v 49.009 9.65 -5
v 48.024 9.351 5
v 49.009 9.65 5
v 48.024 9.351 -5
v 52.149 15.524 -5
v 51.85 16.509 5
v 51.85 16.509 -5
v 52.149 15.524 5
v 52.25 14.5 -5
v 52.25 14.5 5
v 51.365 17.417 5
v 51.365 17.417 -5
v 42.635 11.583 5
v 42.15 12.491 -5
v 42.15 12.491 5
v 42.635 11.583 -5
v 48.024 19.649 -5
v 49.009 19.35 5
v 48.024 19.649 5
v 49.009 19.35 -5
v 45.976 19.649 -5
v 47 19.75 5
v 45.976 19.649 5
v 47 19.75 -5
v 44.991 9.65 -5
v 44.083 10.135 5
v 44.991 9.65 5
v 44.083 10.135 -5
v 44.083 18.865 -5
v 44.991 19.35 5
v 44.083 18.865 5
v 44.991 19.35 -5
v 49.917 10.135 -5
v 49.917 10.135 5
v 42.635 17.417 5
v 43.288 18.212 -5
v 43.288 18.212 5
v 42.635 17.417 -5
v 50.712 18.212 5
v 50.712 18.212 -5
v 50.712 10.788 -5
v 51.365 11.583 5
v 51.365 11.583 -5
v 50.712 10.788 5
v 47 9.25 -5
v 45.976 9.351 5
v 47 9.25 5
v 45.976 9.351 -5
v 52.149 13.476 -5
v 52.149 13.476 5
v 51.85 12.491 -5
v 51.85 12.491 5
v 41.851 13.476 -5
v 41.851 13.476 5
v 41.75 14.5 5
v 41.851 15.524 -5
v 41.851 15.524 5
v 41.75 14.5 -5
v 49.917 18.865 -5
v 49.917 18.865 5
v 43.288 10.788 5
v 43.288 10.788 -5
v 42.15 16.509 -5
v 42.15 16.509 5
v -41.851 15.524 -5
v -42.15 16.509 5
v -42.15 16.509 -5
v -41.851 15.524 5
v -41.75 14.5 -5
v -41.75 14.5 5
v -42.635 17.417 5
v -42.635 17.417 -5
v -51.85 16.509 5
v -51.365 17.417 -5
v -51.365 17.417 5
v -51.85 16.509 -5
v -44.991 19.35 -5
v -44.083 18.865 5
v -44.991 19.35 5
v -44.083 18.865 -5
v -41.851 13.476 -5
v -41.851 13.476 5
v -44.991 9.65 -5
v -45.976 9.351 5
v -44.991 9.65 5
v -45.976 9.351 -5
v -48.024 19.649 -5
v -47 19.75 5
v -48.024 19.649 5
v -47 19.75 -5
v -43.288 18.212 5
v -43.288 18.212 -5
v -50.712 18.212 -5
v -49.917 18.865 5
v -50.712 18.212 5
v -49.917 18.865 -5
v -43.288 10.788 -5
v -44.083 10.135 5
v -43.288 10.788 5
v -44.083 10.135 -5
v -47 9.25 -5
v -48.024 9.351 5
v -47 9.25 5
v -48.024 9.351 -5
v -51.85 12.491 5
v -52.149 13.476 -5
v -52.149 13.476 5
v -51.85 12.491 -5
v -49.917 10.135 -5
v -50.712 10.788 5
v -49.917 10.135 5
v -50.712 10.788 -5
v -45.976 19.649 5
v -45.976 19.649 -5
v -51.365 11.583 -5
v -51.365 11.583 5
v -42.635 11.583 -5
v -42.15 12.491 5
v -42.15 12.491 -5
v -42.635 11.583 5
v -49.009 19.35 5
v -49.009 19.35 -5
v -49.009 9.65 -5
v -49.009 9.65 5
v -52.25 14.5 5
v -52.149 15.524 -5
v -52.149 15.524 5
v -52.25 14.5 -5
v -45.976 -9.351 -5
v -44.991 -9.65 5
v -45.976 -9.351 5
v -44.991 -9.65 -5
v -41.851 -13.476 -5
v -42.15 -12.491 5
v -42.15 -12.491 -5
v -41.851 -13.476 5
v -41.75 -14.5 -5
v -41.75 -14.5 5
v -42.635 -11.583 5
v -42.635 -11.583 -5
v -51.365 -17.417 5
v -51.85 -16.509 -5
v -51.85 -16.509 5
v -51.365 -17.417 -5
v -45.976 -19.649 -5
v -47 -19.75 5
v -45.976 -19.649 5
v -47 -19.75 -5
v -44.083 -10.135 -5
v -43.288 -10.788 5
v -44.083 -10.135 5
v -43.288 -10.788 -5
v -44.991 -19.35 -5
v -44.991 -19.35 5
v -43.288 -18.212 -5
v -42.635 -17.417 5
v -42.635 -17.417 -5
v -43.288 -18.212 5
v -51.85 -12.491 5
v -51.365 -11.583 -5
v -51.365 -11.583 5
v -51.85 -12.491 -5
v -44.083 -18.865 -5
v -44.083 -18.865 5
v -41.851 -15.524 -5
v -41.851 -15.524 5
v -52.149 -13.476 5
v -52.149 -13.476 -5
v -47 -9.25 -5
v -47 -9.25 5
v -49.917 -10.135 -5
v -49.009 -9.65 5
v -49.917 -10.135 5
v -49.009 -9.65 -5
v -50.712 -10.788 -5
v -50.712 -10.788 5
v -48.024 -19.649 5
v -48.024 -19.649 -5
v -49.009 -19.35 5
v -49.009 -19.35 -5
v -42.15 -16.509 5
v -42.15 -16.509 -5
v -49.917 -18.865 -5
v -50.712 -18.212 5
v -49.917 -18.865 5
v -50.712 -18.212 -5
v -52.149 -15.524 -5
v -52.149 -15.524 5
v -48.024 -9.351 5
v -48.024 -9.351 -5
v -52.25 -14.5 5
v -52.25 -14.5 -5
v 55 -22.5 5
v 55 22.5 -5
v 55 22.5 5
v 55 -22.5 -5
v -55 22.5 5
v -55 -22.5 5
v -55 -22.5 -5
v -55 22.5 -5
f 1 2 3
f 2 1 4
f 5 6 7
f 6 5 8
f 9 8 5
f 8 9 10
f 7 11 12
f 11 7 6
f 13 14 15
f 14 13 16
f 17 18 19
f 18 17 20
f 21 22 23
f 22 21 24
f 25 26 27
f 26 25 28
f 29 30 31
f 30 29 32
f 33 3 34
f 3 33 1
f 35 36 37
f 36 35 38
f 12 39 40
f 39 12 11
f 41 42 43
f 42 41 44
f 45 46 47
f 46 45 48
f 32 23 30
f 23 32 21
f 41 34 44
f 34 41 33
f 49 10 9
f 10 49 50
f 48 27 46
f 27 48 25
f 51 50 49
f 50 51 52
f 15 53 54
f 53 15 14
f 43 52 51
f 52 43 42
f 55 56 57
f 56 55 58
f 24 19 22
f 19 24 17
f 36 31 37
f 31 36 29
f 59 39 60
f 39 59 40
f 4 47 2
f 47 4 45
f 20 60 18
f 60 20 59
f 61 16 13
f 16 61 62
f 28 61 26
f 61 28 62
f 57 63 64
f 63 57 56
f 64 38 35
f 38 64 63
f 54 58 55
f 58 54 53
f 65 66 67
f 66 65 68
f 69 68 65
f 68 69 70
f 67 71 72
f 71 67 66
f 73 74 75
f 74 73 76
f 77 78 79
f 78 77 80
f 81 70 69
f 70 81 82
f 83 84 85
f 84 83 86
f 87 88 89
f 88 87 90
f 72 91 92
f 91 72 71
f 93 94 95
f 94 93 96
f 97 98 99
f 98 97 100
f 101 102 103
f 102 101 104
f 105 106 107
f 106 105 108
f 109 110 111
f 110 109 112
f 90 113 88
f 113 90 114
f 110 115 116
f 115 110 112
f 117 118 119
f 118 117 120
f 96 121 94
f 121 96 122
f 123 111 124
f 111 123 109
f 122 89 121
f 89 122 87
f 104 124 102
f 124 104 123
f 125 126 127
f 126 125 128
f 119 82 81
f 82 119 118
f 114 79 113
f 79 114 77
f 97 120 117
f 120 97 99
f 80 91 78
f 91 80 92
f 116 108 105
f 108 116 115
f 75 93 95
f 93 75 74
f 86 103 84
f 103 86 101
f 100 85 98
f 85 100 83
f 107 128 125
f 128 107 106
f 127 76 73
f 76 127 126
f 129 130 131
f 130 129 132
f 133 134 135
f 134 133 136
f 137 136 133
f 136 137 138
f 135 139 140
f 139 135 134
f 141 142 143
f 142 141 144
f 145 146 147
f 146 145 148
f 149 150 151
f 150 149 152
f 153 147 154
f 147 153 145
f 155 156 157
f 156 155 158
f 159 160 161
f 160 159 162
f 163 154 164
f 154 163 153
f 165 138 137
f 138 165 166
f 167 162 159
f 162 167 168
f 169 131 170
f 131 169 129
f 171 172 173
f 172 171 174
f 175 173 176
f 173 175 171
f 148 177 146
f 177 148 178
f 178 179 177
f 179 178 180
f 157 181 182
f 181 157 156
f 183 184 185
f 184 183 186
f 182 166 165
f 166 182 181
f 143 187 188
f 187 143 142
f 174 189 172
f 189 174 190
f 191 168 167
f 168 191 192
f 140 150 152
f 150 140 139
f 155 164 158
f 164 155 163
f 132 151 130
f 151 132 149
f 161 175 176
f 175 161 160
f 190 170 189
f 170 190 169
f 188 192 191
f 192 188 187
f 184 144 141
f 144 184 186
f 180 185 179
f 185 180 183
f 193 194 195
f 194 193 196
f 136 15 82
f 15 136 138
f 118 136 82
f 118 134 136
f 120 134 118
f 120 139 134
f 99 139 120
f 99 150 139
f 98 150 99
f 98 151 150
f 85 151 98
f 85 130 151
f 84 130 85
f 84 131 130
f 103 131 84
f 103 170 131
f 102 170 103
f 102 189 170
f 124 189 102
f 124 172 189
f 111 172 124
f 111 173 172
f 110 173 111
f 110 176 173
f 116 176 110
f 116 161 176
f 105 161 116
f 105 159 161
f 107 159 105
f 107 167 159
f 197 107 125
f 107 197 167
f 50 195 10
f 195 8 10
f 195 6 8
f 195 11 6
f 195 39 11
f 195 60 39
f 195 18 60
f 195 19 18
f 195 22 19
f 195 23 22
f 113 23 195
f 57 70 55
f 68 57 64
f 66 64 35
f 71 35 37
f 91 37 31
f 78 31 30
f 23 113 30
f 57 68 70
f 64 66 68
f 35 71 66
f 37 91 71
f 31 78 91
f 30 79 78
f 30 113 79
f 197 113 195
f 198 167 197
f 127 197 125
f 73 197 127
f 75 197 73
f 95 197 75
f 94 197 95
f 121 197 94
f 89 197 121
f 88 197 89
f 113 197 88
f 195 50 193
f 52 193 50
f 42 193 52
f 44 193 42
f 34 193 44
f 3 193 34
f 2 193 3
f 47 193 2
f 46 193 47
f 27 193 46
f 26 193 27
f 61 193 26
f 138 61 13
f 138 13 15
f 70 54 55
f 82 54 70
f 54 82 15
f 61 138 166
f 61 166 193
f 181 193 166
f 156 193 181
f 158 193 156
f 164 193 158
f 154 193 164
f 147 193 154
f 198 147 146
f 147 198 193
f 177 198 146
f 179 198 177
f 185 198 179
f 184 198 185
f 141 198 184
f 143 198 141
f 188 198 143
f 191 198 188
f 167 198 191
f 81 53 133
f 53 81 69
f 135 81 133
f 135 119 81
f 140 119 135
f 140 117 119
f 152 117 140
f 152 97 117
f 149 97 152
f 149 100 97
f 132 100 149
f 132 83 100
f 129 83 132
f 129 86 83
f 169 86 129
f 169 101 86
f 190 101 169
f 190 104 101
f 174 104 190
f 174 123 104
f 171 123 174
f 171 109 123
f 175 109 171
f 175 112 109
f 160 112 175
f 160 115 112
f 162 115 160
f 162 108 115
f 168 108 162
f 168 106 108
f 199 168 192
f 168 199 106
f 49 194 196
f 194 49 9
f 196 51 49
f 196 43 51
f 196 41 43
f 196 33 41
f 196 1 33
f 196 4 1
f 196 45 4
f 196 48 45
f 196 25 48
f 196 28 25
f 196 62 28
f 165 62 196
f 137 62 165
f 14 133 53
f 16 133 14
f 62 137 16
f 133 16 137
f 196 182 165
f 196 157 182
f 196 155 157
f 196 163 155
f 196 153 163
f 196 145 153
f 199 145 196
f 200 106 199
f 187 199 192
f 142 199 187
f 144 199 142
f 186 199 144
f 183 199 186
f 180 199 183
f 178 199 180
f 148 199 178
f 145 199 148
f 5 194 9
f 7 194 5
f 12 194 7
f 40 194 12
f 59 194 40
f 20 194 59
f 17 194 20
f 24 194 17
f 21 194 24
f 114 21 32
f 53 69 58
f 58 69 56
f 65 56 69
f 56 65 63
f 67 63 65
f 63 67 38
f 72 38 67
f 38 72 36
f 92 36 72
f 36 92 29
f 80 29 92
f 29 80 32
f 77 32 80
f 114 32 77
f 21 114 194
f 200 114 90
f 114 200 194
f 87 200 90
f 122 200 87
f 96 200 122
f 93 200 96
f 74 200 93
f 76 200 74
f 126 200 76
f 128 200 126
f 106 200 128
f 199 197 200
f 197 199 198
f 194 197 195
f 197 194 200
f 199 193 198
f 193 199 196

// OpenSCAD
$fn = 32;

// ----------------------------------------------------------------------
// Corner plate 110 x 45 x 10
// 3 holes, centres taken from the edge offset
// ----------------------------------------------------------------------

// --- parameters (mm) ---
plate = [110, 45, 10];  // overall size (x, y, z)
holes = 3;              // number of holes the drawing asks for
hole_d = 10.5;          // hole diameter
edge = 8;               // hole centre offset from the plate edge

// --- derived feature positions (mm) ---
corner_x = plate[0] / 2 - edge;  // = 47   corner hole X
corner_y = plate[1] / 2 - edge;  // = 14.5   corner hole Y
feature_centers = [
  [corner_x, corner_y],
  [-corner_x, corner_y],
  [-corner_x, -corner_y]
];   // hole centres the loop below drills

// plate outline, every hole drilled through with the same cutters
difference() {
  cube(plate, center = true);
  for (centre = feature_centers)
    translate([centre[0], centre[1], 0])
      cylinder(d = hole_d, h = plate[2] + 2, center = true);
}
